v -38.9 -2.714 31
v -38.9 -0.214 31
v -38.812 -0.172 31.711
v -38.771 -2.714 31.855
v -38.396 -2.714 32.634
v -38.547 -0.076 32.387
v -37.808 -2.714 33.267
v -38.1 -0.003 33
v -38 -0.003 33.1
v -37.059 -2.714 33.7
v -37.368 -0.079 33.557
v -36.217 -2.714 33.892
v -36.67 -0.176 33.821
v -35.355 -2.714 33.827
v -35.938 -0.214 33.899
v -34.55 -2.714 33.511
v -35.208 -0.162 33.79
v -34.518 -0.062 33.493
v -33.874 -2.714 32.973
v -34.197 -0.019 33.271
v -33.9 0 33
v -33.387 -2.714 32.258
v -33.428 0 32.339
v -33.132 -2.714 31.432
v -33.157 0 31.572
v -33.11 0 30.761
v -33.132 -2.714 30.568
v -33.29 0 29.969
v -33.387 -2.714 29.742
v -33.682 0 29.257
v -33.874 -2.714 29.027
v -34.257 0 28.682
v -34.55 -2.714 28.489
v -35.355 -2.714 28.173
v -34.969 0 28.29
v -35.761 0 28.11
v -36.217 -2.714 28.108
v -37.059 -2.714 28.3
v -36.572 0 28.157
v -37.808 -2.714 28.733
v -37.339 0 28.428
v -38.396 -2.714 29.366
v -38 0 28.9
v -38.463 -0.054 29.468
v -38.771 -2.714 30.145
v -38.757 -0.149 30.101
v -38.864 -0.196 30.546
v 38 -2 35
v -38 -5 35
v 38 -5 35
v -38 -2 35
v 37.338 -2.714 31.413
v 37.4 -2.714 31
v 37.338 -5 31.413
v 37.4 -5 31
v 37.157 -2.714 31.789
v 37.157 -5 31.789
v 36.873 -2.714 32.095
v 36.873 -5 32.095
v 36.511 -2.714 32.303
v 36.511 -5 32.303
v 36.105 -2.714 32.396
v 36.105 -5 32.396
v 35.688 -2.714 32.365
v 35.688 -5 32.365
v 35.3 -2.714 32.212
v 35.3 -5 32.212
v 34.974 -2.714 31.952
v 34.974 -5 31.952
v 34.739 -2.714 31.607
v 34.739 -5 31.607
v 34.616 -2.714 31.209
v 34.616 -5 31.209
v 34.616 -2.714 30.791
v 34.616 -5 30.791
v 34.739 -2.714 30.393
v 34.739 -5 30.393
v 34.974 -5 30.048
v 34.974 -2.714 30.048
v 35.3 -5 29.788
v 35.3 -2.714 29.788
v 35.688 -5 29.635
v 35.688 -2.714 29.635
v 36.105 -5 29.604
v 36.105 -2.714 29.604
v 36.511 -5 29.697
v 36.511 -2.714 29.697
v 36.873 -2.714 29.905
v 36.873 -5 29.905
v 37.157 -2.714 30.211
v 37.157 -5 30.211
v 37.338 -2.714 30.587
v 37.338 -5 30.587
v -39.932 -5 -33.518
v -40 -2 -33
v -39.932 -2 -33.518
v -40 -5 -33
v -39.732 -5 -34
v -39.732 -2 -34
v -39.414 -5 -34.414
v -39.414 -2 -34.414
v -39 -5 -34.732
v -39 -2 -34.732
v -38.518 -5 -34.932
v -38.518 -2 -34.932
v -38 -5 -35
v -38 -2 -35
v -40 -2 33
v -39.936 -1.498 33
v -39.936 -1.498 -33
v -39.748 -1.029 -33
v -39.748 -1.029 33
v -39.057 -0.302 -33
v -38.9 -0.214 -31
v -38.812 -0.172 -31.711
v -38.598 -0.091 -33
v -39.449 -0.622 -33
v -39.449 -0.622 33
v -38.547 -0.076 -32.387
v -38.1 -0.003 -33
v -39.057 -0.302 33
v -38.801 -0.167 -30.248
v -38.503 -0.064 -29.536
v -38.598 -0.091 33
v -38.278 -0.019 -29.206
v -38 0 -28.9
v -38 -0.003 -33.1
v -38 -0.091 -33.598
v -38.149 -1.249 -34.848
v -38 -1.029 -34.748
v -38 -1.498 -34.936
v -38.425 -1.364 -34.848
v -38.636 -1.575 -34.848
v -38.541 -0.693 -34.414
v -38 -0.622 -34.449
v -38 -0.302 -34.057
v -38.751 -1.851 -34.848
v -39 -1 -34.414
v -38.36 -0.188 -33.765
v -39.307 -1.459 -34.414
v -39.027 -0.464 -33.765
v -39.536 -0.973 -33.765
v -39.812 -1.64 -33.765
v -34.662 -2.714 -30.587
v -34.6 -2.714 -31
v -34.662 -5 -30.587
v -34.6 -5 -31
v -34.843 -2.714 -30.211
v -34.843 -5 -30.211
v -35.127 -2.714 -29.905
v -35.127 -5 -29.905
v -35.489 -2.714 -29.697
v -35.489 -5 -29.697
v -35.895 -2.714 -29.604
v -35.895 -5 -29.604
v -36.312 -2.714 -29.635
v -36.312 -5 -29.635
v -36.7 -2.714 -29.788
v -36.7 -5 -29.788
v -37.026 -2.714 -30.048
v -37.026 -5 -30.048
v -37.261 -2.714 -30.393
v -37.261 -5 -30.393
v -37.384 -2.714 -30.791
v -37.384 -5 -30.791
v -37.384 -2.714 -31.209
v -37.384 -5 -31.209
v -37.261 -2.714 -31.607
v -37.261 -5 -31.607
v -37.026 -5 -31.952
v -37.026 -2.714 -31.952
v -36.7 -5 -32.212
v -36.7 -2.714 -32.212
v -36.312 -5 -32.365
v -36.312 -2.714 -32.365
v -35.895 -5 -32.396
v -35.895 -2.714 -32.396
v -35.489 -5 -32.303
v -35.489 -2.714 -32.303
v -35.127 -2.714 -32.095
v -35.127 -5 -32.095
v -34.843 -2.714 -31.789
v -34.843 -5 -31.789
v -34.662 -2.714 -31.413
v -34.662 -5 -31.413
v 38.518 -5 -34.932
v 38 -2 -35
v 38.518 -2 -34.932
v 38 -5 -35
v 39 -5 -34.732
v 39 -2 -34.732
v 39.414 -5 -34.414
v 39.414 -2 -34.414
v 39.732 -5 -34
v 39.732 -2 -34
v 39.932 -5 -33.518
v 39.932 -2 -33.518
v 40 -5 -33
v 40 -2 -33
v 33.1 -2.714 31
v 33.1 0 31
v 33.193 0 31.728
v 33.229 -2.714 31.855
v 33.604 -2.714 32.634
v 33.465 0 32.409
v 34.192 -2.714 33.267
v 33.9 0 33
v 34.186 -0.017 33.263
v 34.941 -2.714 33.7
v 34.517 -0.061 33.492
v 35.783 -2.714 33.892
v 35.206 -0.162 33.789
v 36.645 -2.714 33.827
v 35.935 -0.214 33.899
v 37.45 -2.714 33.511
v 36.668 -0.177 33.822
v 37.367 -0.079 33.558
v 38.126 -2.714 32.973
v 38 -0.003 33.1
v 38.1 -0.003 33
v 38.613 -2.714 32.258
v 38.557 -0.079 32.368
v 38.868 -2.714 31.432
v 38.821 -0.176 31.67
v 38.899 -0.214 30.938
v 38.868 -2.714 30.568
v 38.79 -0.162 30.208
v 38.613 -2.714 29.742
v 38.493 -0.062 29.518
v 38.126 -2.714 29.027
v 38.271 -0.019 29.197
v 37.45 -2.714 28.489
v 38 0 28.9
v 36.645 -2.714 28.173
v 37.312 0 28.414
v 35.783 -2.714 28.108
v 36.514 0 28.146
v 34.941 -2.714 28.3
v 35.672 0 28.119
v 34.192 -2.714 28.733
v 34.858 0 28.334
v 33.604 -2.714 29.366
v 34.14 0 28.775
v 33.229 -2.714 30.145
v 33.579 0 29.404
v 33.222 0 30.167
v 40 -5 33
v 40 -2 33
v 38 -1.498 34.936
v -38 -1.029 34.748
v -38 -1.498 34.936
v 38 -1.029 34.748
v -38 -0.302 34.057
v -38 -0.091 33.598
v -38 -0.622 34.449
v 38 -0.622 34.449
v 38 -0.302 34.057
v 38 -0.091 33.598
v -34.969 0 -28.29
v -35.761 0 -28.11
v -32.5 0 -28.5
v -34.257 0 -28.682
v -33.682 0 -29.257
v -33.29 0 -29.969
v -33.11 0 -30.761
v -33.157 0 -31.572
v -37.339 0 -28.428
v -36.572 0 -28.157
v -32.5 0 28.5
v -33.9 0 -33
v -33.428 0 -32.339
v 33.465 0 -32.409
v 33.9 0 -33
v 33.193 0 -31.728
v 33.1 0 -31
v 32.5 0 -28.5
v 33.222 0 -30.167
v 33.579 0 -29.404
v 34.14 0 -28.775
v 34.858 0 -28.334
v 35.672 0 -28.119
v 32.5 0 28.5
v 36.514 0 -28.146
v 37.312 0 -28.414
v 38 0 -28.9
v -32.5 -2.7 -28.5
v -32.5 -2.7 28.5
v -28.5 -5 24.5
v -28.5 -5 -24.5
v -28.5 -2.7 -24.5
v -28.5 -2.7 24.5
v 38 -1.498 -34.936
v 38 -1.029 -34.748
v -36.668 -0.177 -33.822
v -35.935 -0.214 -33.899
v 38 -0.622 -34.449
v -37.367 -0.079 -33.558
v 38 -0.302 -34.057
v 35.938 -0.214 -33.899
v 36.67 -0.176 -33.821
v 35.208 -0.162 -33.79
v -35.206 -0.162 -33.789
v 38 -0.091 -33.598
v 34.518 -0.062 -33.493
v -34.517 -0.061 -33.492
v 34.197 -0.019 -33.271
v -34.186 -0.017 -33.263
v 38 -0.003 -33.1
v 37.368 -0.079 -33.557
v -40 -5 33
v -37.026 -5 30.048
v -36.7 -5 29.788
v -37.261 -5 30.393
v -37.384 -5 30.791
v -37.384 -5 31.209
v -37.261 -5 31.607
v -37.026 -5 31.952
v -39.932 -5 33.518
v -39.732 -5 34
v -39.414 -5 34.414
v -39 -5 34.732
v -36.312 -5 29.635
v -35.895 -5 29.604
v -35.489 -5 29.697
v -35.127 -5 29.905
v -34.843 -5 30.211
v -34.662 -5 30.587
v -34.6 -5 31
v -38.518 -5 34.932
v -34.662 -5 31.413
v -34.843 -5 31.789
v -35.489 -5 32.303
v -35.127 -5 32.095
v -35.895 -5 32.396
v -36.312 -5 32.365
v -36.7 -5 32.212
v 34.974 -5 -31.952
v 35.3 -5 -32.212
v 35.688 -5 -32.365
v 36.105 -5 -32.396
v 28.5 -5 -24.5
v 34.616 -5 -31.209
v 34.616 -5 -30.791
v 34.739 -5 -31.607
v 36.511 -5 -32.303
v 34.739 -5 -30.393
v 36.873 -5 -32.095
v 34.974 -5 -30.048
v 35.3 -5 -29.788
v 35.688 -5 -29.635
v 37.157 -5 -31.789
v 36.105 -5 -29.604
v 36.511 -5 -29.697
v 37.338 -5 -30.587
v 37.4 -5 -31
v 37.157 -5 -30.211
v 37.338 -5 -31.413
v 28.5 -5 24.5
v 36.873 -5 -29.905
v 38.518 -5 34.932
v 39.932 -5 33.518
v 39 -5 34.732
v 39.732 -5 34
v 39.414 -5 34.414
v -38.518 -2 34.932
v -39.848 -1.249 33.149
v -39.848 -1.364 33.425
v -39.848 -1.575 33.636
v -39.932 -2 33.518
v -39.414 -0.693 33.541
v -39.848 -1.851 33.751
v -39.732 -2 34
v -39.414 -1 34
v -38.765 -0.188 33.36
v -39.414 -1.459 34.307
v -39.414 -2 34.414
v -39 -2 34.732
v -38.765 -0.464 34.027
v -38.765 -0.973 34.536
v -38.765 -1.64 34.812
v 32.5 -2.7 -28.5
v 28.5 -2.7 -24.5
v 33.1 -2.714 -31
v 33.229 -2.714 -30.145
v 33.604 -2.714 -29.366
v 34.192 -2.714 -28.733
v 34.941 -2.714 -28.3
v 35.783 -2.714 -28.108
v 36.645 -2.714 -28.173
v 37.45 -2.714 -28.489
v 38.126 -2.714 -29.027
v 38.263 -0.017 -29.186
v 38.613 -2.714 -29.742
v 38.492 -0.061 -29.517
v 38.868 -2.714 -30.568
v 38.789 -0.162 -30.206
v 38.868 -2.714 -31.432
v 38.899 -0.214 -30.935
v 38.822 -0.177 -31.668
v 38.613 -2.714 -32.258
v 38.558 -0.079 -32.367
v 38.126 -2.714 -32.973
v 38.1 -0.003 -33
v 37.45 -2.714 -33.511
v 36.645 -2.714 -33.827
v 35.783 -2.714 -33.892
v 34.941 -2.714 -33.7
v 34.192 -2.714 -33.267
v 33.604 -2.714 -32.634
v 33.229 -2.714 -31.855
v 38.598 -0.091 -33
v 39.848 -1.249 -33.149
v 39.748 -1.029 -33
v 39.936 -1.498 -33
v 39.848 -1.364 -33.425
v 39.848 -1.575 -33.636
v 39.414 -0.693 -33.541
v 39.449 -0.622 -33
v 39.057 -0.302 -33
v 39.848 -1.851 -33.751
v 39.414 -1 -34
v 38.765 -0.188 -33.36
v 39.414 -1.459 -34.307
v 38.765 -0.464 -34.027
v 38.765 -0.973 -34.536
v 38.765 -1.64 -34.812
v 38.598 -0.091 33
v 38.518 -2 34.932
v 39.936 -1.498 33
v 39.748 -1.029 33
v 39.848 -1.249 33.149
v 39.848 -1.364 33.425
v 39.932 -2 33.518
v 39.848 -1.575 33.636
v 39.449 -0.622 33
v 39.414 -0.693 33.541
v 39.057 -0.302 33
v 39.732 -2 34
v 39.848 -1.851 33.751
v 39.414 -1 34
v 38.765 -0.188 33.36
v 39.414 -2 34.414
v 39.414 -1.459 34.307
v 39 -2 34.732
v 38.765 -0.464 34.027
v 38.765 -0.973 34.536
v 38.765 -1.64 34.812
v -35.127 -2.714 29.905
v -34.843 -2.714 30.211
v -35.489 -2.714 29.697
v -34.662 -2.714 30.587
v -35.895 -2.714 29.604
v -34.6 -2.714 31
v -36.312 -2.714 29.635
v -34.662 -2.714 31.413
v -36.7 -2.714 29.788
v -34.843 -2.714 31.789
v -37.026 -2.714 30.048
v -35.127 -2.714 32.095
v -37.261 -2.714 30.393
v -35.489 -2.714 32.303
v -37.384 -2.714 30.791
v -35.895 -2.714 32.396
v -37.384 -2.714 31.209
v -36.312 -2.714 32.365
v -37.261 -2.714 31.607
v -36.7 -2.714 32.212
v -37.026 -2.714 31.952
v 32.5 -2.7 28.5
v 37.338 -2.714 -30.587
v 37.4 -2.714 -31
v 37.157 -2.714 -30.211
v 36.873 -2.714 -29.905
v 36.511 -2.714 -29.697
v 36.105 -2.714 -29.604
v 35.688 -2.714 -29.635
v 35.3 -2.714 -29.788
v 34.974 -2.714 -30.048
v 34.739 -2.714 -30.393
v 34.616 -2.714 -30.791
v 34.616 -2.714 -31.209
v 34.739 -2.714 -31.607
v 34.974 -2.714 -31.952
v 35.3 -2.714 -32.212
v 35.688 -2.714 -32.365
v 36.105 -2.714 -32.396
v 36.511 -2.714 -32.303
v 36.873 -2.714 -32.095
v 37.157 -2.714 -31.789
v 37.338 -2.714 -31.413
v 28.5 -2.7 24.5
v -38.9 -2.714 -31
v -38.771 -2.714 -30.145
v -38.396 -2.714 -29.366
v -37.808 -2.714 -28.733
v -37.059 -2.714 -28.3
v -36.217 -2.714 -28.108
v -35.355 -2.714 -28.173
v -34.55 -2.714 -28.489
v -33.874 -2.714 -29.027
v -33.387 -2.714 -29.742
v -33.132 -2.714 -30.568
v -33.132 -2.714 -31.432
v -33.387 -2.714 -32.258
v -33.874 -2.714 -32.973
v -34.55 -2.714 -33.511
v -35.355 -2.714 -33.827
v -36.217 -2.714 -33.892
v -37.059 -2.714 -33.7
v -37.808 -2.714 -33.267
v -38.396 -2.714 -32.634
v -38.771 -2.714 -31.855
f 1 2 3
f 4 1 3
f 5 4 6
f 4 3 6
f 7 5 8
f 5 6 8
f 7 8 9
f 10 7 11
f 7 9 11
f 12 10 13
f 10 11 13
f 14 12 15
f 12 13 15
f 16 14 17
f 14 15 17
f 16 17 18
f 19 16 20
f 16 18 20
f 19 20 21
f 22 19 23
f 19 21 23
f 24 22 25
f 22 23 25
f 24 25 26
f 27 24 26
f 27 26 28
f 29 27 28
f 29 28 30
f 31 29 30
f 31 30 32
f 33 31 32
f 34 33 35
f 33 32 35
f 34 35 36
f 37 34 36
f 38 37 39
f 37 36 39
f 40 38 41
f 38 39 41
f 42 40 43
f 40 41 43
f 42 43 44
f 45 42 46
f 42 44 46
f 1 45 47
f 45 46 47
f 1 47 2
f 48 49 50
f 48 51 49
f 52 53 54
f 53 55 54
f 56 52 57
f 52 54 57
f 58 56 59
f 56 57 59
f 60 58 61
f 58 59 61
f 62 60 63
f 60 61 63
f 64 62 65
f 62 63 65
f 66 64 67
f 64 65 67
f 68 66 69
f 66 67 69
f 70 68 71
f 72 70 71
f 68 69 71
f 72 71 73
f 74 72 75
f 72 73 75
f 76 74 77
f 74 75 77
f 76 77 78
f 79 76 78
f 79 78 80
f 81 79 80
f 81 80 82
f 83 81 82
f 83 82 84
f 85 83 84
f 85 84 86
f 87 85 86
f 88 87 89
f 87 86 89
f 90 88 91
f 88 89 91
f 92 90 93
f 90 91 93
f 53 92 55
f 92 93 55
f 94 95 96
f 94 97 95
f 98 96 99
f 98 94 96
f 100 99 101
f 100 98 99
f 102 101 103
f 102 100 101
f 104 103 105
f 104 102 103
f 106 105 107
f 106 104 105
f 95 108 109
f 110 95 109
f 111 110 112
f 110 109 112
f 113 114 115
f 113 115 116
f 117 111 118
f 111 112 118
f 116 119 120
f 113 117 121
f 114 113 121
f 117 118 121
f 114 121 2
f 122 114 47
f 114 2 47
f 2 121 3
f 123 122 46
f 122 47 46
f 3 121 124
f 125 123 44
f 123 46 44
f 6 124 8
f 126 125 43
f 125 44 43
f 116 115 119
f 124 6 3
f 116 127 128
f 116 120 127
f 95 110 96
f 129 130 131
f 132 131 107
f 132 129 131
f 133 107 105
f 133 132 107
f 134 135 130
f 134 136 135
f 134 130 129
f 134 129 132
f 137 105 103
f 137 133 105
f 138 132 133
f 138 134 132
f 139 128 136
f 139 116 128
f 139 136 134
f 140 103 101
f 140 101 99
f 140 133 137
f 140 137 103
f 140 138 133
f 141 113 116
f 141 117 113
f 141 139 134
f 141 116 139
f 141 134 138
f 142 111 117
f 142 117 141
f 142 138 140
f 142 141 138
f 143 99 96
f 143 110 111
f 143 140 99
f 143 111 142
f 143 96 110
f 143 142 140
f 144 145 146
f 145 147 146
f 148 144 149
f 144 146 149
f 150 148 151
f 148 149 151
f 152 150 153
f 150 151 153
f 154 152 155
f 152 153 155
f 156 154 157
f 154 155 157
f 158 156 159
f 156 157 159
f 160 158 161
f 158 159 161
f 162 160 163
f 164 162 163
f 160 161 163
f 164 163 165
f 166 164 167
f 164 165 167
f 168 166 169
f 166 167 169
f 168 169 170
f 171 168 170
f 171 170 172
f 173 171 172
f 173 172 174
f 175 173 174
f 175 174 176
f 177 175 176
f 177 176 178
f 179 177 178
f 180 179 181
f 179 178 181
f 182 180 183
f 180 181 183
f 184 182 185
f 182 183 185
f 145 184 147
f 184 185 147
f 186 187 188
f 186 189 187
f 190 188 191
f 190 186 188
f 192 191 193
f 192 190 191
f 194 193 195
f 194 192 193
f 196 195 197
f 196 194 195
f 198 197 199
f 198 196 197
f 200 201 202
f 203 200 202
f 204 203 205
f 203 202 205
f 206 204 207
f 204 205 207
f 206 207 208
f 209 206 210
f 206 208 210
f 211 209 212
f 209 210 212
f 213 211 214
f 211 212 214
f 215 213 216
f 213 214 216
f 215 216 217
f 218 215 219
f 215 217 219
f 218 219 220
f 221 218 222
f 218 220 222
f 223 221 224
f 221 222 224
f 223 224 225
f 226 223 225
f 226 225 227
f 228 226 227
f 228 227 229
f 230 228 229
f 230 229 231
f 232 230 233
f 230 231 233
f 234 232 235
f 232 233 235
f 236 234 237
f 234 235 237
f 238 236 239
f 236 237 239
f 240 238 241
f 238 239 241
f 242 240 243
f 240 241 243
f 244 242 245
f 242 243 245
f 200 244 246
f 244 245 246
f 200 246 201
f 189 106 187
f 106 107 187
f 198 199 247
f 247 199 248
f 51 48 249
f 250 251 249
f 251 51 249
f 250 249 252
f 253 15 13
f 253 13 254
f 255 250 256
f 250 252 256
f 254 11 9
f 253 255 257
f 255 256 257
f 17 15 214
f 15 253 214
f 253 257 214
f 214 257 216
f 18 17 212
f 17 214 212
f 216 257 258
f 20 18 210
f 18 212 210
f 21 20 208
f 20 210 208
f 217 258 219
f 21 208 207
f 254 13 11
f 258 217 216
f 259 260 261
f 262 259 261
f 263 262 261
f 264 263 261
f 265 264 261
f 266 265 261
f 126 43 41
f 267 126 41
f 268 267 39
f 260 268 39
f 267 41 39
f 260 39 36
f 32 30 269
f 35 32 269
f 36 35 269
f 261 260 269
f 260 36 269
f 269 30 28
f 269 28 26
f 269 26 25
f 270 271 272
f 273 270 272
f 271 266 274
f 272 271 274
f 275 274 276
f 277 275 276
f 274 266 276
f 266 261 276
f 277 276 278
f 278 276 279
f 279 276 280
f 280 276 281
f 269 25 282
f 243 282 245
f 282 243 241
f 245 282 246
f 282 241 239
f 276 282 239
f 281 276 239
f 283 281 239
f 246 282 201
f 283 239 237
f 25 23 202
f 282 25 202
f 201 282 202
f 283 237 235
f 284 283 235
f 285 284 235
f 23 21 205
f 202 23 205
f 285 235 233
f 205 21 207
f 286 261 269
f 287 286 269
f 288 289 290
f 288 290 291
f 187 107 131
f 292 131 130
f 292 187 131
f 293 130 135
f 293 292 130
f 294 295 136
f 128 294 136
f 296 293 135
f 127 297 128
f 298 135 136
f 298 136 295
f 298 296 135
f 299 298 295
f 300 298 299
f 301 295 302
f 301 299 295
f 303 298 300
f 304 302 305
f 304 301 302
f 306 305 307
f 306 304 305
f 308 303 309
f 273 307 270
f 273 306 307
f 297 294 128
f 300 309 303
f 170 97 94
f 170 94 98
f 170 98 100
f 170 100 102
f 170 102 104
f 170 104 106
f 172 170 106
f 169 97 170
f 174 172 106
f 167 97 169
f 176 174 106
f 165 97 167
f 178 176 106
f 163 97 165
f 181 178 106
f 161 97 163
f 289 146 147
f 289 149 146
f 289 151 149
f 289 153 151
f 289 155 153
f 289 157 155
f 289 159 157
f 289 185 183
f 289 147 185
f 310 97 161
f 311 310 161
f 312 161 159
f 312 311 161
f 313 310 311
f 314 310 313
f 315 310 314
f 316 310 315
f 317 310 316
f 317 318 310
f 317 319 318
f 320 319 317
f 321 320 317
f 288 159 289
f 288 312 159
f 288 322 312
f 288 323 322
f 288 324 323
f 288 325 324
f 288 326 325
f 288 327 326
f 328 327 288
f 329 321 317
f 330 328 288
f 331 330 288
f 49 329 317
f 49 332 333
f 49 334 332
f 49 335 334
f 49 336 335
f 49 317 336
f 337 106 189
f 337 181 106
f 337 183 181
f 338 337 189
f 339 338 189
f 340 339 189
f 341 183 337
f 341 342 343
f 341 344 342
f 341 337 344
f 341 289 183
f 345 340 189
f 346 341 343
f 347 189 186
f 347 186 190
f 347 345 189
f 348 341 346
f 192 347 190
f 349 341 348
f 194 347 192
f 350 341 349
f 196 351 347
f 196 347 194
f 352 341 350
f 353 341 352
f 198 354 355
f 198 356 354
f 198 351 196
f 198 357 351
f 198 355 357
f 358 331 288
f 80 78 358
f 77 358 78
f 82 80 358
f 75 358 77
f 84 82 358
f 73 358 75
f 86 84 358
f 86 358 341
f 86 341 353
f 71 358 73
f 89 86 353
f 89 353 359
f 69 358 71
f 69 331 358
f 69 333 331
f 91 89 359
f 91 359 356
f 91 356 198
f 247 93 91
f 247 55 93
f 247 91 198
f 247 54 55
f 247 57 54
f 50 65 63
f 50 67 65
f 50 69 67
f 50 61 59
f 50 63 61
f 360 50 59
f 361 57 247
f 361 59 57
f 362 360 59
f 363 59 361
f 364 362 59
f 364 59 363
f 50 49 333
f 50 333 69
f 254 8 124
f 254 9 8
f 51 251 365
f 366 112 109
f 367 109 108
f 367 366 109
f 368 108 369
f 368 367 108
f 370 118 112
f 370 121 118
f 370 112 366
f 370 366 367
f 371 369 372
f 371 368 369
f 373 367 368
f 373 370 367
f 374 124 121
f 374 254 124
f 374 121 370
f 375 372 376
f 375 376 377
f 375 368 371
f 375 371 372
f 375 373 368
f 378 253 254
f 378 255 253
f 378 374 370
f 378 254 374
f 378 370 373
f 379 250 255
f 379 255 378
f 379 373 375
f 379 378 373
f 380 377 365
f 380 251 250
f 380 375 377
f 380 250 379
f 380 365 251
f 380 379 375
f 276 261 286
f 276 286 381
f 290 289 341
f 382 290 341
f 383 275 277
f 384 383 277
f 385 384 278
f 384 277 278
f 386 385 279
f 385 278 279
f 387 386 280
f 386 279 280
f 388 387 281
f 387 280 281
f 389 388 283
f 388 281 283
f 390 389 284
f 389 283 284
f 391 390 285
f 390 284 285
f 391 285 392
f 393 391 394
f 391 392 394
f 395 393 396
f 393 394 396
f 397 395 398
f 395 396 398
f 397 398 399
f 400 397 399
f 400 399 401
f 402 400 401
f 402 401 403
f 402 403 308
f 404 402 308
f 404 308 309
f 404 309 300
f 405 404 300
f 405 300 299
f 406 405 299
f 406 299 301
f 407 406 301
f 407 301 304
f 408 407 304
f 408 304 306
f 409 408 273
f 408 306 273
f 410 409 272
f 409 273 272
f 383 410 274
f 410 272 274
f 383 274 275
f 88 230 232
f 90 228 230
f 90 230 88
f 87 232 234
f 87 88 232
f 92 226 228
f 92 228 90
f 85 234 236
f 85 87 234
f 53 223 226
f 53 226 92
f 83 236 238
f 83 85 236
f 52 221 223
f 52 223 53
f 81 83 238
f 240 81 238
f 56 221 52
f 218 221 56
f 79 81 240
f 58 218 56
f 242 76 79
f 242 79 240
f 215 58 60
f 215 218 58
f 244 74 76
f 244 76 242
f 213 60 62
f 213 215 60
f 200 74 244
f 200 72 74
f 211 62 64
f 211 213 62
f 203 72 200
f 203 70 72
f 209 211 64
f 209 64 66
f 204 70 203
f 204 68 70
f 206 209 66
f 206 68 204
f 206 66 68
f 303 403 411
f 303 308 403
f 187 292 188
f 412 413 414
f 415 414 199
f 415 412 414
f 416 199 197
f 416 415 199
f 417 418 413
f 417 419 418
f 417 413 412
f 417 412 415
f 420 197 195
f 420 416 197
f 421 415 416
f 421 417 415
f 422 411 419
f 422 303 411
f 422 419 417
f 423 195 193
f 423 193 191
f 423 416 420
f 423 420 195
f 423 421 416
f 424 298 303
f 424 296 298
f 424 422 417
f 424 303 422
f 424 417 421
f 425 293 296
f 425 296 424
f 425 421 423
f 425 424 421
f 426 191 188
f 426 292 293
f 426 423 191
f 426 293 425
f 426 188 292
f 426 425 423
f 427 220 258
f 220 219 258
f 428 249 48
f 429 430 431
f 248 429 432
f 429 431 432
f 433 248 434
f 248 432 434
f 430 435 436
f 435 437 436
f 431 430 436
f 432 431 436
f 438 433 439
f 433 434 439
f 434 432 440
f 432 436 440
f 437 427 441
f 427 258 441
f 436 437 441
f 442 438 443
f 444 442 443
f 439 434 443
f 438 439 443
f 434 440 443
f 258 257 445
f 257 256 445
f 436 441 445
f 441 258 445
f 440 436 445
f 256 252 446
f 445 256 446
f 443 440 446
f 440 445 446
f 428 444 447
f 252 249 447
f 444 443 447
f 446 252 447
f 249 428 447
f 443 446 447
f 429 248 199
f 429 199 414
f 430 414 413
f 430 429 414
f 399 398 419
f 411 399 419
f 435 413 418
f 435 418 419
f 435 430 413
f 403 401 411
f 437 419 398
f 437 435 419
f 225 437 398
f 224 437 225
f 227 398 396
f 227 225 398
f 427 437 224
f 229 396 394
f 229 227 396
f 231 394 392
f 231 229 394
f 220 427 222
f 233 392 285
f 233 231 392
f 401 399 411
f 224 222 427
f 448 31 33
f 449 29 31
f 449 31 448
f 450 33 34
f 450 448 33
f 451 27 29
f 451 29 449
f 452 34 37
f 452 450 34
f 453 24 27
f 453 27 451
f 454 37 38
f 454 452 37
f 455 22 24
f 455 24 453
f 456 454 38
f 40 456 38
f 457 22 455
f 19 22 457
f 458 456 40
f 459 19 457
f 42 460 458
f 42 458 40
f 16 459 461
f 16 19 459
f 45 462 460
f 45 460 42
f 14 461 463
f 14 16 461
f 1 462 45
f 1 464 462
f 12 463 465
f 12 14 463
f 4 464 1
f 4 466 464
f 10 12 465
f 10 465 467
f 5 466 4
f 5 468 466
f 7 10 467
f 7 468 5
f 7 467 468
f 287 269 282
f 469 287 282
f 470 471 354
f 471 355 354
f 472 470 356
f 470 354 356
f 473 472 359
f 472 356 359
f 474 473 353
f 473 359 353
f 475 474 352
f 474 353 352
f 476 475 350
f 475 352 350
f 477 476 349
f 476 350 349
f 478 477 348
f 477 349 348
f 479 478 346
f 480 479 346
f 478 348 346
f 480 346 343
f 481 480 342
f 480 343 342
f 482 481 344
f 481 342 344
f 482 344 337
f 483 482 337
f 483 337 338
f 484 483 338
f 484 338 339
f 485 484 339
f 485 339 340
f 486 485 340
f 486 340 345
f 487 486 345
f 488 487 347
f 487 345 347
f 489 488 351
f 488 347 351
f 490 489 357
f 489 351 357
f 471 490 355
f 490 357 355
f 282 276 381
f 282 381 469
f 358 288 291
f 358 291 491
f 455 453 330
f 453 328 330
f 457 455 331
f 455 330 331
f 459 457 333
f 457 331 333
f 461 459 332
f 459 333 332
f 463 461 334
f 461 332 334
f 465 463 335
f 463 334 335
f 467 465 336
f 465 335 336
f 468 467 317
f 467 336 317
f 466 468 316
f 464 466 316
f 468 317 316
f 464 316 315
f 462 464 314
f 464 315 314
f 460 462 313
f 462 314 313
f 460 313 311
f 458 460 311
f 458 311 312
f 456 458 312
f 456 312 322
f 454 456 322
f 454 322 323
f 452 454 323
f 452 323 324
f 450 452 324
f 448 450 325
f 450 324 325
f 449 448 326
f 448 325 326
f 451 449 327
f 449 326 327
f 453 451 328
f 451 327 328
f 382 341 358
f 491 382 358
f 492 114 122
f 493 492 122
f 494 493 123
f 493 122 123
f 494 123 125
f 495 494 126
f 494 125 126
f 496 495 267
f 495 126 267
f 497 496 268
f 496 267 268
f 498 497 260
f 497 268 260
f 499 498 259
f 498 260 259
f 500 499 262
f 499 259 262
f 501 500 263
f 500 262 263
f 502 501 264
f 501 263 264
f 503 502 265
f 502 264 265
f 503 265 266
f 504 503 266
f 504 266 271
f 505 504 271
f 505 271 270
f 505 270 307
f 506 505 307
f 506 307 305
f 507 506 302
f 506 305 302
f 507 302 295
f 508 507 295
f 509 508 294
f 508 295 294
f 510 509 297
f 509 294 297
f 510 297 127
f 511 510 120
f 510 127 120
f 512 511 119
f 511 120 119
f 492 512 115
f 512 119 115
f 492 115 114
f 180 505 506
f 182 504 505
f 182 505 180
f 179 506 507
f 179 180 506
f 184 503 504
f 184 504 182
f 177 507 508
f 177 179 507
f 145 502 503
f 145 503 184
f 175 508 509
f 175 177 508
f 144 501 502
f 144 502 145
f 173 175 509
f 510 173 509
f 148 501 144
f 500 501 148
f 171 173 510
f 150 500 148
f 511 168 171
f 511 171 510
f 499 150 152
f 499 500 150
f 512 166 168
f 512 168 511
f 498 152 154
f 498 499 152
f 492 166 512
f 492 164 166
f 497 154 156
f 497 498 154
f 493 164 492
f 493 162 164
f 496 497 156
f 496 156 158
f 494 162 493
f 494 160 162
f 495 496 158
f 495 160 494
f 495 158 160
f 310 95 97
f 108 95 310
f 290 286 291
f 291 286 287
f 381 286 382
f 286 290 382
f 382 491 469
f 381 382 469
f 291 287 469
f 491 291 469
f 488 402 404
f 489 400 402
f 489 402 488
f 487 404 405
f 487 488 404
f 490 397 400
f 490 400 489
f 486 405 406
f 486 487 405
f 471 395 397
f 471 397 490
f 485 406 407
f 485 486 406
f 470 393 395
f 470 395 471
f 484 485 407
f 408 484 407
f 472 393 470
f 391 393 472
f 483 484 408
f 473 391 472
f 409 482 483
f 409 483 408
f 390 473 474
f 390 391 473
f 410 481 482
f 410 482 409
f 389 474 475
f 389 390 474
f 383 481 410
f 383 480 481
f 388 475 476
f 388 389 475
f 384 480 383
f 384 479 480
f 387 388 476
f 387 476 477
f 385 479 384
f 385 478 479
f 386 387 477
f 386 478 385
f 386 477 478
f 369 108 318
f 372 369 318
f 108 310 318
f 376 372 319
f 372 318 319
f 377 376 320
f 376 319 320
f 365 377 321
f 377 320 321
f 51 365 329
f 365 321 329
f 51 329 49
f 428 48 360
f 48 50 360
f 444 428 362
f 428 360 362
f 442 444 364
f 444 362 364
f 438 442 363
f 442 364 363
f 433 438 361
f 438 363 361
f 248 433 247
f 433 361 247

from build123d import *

# Parameters (mm, degrees)
F0_W           = 80
F0_H           = 70
F0_W_2         = 65
F0_H_2         = 57
F1_DEPTH       = 5
F2_R           = 2
F5_D           = 2.8
F5_DEPTH       = 5
F5_START       = 0.213943
F5_CBORE_D     = 5.8
F5_CBORE_DEPTH = 2.5
F5_TIP         = 0.8412048666
F7_W           = 65
F7_H           = 57
F7_W_2         = 57
F7_H_2         = 49
F8_DEPTH       = 2.3


with BuildPart() as f1:
    # F0 (on Front) → F1 (new body)
    with BuildSketch(Plane.XZ):
        Rectangle(F0_W, F0_H)
        Rectangle(F0_W_2, F0_H_2, mode=Mode.SUBTRACT)
    extrude(amount=F1_DEPTH)

    # F2
    f2_edges = [f1.edges().sort_by_distance(p)[0] for p in [
        (0, 0, 35),
        (-40, 0, 0),
        (-40, -2.5, 35),
        (0, 0, -35),
        (-40, -2.5, -35),
        (40, 0, 0),
        (40, -2.5, -35),
        (40, -2.5, 35),
    ]]
    fillet(f2_edges, radius=F2_R)

    # F5
    # its depths count from where the whole tool has entered the part; down to there all is cleared
    with Locations(Plane(origin=(0, 0, 0), x_dir=(-1, 0, 0), z_dir=(0, 1, 0)).offset(-F5_START)):
        with Locations((-36, -31), (-36, 31), (36, 31), (36, -31)):
            CounterBoreHole(F5_D / 2, F5_CBORE_D / 2, F5_CBORE_DEPTH, depth=F5_DEPTH)
            with Locations((0, 0, -(F5_DEPTH + F5_TIP / 2))):  # 118° drill point
                Cone(0, F5_D / 2, F5_TIP, mode=Mode.SUBTRACT)

    # F7 (on offset) → F8 (join)
    with BuildSketch(Plane.XZ.offset(5)):
        Rectangle(F7_W, F7_H)
        Rectangle(F7_W_2, F7_H_2, mode=Mode.SUBTRACT)
    extrude(amount=-F8_DEPTH)


solid = f1.part
